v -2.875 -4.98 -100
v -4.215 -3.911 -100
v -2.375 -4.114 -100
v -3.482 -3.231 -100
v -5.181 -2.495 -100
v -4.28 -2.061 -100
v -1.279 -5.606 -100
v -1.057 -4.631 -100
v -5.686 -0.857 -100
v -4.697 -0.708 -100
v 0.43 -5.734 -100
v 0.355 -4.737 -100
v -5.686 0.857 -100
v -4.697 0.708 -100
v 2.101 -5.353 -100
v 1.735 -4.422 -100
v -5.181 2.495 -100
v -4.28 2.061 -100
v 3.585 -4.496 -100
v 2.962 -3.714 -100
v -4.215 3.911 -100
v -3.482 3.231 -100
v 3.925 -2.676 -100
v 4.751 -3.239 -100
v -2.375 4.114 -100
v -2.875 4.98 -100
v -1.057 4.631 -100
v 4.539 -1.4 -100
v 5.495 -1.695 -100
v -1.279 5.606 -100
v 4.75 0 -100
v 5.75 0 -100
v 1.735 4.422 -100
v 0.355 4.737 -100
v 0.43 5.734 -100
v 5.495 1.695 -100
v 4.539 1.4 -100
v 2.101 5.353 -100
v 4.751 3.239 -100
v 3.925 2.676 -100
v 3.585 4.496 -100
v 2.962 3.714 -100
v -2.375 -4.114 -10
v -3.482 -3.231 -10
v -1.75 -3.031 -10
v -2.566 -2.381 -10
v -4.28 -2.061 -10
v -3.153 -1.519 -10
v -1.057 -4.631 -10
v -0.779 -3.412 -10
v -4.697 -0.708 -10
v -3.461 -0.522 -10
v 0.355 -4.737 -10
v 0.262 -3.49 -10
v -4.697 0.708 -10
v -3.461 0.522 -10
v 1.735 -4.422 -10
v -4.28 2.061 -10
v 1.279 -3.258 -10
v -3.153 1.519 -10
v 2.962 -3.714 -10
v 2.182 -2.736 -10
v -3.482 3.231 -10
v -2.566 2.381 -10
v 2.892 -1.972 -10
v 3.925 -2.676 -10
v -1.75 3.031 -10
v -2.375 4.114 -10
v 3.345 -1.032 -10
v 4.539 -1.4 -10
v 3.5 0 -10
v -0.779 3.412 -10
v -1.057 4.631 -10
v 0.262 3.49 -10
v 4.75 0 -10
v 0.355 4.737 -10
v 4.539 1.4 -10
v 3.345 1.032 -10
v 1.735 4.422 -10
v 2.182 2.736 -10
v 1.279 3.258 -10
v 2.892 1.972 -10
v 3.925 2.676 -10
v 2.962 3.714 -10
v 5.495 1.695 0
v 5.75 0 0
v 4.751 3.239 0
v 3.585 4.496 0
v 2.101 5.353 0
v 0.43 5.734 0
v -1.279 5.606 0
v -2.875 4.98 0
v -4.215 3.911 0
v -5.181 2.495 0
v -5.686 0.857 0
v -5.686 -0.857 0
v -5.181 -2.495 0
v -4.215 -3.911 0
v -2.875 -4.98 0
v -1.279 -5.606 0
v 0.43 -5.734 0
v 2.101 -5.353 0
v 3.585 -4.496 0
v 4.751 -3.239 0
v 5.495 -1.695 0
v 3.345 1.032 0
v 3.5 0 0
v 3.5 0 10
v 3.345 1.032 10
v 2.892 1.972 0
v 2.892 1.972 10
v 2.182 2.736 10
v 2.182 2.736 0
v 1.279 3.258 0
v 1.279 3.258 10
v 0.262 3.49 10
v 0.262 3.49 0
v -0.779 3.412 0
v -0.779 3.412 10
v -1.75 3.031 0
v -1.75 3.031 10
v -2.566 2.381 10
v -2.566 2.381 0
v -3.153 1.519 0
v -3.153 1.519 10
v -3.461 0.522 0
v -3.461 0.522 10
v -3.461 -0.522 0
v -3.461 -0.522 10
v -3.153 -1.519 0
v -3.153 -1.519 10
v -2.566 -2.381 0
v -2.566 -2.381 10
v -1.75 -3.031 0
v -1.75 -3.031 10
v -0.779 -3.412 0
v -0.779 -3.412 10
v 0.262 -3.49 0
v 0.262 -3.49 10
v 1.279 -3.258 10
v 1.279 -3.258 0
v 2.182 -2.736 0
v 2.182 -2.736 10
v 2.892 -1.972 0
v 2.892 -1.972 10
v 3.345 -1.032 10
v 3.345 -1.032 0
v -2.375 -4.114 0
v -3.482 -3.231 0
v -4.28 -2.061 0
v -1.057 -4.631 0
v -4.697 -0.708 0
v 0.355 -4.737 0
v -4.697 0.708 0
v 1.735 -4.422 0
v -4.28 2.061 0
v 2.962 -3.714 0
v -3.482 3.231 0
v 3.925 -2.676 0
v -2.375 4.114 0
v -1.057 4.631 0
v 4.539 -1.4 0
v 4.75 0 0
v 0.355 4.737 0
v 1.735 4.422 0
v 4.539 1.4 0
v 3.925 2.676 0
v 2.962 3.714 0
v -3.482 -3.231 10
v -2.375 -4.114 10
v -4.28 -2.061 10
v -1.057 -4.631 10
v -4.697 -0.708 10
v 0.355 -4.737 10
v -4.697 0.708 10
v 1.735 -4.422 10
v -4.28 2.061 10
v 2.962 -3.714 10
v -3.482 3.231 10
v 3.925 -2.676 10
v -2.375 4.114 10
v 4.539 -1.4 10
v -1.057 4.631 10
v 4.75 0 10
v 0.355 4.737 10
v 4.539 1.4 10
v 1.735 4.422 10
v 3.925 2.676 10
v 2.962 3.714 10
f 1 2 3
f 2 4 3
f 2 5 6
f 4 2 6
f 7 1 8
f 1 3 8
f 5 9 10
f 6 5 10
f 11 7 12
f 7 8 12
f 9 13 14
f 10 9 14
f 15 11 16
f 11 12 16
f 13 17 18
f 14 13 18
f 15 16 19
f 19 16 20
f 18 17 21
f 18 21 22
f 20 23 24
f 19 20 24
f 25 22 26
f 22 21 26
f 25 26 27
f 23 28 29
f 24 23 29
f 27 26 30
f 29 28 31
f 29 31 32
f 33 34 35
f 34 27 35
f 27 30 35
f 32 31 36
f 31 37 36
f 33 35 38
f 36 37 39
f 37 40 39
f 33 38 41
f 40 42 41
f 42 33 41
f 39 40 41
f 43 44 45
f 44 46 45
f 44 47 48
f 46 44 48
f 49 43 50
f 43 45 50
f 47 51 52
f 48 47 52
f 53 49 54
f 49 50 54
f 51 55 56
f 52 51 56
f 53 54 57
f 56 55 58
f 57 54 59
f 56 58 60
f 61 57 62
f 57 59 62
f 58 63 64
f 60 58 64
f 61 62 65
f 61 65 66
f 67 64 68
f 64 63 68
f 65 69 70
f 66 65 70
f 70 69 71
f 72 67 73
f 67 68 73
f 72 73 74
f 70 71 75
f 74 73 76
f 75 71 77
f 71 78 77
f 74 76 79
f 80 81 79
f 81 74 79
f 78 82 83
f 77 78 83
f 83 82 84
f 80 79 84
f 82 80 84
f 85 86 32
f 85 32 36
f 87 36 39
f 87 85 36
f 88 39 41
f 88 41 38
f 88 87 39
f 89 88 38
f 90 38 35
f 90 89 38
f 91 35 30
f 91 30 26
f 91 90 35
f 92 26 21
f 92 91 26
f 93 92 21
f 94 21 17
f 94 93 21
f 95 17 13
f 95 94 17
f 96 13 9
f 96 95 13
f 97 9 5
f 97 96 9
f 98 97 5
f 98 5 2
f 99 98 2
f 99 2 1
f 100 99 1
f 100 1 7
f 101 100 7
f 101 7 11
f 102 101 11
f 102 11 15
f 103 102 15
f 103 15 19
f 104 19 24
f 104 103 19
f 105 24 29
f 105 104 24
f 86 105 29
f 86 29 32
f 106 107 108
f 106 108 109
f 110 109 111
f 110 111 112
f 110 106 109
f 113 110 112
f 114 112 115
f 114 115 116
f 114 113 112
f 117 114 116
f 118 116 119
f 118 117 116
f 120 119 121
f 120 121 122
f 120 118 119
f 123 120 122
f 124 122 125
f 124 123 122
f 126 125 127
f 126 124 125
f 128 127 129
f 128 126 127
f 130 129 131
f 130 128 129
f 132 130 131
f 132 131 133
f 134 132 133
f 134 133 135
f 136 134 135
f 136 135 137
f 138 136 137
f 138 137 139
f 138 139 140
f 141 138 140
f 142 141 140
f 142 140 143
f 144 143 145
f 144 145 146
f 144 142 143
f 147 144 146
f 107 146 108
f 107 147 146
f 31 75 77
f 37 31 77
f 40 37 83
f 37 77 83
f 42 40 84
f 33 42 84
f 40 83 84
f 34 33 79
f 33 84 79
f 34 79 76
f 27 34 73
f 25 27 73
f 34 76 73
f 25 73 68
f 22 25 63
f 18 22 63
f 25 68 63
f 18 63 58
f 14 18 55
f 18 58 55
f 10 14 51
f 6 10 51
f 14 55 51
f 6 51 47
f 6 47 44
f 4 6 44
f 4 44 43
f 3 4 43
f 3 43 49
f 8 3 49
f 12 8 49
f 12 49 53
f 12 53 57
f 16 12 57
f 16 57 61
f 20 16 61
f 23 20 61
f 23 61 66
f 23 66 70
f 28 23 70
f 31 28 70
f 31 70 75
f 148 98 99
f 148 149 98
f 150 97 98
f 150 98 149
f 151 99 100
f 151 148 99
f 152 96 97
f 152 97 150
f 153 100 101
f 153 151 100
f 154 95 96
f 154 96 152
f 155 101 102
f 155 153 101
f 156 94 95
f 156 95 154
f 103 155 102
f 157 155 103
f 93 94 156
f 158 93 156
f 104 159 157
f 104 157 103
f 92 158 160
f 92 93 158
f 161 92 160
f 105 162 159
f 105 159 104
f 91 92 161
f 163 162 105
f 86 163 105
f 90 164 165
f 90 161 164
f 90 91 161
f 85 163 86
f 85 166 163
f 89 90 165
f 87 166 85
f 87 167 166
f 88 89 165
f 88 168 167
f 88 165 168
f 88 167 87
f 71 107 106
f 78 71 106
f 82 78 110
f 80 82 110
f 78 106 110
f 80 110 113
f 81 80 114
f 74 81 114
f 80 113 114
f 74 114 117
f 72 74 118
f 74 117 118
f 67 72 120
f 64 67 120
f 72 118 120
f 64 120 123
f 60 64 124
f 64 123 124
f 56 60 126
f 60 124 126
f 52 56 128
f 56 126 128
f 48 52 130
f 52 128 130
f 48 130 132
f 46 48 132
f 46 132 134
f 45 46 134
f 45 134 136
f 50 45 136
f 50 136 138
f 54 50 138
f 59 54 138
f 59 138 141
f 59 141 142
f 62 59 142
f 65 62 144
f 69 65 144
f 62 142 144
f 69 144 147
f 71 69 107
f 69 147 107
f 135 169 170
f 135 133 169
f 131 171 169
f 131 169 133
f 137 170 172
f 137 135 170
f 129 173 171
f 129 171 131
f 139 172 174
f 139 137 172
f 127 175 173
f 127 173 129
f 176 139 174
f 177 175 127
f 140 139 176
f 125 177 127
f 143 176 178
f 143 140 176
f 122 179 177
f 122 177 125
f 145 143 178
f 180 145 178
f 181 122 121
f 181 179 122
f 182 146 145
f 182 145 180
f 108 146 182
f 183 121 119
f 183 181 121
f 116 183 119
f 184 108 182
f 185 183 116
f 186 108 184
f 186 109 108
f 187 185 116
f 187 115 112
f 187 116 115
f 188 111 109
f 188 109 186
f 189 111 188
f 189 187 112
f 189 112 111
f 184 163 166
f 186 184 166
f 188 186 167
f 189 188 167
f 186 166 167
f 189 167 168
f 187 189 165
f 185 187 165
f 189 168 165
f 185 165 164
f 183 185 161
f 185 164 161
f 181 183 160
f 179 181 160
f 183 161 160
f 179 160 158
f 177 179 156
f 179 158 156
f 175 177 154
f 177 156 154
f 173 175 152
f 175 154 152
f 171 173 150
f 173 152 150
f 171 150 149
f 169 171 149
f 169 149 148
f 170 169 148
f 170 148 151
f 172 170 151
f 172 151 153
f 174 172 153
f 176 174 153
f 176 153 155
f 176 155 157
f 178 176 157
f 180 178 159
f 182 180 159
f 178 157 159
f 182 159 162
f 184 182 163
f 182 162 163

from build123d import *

# Parameters (mm, degrees)
F0_R          = 5.75
F0_R_2        = 4.75
F1_DEPTH      = 100
F2_R          = 4.75
F2_R_2        = 3.5
F3_DEPTH      = 10
F3_DEPTH_BACK = 10


with BuildPart() as f1:
    # F0 (on Top) → F1 (new body)
    with BuildSketch(Plane.XY):
        Circle(F0_R)
        Circle(F0_R_2, mode=Mode.SUBTRACT)
    extrude(amount=-F1_DEPTH)

    # F2 (on face) → F3 (join, two sides)
    with BuildSketch(Plane.XY) as f3_sk:
        Circle(F2_R)
        Circle(F2_R_2, mode=Mode.SUBTRACT)
    extrude(amount=F3_DEPTH)
    extrude(f3_sk.sketch, amount=-F3_DEPTH_BACK)


solid = f1.part
